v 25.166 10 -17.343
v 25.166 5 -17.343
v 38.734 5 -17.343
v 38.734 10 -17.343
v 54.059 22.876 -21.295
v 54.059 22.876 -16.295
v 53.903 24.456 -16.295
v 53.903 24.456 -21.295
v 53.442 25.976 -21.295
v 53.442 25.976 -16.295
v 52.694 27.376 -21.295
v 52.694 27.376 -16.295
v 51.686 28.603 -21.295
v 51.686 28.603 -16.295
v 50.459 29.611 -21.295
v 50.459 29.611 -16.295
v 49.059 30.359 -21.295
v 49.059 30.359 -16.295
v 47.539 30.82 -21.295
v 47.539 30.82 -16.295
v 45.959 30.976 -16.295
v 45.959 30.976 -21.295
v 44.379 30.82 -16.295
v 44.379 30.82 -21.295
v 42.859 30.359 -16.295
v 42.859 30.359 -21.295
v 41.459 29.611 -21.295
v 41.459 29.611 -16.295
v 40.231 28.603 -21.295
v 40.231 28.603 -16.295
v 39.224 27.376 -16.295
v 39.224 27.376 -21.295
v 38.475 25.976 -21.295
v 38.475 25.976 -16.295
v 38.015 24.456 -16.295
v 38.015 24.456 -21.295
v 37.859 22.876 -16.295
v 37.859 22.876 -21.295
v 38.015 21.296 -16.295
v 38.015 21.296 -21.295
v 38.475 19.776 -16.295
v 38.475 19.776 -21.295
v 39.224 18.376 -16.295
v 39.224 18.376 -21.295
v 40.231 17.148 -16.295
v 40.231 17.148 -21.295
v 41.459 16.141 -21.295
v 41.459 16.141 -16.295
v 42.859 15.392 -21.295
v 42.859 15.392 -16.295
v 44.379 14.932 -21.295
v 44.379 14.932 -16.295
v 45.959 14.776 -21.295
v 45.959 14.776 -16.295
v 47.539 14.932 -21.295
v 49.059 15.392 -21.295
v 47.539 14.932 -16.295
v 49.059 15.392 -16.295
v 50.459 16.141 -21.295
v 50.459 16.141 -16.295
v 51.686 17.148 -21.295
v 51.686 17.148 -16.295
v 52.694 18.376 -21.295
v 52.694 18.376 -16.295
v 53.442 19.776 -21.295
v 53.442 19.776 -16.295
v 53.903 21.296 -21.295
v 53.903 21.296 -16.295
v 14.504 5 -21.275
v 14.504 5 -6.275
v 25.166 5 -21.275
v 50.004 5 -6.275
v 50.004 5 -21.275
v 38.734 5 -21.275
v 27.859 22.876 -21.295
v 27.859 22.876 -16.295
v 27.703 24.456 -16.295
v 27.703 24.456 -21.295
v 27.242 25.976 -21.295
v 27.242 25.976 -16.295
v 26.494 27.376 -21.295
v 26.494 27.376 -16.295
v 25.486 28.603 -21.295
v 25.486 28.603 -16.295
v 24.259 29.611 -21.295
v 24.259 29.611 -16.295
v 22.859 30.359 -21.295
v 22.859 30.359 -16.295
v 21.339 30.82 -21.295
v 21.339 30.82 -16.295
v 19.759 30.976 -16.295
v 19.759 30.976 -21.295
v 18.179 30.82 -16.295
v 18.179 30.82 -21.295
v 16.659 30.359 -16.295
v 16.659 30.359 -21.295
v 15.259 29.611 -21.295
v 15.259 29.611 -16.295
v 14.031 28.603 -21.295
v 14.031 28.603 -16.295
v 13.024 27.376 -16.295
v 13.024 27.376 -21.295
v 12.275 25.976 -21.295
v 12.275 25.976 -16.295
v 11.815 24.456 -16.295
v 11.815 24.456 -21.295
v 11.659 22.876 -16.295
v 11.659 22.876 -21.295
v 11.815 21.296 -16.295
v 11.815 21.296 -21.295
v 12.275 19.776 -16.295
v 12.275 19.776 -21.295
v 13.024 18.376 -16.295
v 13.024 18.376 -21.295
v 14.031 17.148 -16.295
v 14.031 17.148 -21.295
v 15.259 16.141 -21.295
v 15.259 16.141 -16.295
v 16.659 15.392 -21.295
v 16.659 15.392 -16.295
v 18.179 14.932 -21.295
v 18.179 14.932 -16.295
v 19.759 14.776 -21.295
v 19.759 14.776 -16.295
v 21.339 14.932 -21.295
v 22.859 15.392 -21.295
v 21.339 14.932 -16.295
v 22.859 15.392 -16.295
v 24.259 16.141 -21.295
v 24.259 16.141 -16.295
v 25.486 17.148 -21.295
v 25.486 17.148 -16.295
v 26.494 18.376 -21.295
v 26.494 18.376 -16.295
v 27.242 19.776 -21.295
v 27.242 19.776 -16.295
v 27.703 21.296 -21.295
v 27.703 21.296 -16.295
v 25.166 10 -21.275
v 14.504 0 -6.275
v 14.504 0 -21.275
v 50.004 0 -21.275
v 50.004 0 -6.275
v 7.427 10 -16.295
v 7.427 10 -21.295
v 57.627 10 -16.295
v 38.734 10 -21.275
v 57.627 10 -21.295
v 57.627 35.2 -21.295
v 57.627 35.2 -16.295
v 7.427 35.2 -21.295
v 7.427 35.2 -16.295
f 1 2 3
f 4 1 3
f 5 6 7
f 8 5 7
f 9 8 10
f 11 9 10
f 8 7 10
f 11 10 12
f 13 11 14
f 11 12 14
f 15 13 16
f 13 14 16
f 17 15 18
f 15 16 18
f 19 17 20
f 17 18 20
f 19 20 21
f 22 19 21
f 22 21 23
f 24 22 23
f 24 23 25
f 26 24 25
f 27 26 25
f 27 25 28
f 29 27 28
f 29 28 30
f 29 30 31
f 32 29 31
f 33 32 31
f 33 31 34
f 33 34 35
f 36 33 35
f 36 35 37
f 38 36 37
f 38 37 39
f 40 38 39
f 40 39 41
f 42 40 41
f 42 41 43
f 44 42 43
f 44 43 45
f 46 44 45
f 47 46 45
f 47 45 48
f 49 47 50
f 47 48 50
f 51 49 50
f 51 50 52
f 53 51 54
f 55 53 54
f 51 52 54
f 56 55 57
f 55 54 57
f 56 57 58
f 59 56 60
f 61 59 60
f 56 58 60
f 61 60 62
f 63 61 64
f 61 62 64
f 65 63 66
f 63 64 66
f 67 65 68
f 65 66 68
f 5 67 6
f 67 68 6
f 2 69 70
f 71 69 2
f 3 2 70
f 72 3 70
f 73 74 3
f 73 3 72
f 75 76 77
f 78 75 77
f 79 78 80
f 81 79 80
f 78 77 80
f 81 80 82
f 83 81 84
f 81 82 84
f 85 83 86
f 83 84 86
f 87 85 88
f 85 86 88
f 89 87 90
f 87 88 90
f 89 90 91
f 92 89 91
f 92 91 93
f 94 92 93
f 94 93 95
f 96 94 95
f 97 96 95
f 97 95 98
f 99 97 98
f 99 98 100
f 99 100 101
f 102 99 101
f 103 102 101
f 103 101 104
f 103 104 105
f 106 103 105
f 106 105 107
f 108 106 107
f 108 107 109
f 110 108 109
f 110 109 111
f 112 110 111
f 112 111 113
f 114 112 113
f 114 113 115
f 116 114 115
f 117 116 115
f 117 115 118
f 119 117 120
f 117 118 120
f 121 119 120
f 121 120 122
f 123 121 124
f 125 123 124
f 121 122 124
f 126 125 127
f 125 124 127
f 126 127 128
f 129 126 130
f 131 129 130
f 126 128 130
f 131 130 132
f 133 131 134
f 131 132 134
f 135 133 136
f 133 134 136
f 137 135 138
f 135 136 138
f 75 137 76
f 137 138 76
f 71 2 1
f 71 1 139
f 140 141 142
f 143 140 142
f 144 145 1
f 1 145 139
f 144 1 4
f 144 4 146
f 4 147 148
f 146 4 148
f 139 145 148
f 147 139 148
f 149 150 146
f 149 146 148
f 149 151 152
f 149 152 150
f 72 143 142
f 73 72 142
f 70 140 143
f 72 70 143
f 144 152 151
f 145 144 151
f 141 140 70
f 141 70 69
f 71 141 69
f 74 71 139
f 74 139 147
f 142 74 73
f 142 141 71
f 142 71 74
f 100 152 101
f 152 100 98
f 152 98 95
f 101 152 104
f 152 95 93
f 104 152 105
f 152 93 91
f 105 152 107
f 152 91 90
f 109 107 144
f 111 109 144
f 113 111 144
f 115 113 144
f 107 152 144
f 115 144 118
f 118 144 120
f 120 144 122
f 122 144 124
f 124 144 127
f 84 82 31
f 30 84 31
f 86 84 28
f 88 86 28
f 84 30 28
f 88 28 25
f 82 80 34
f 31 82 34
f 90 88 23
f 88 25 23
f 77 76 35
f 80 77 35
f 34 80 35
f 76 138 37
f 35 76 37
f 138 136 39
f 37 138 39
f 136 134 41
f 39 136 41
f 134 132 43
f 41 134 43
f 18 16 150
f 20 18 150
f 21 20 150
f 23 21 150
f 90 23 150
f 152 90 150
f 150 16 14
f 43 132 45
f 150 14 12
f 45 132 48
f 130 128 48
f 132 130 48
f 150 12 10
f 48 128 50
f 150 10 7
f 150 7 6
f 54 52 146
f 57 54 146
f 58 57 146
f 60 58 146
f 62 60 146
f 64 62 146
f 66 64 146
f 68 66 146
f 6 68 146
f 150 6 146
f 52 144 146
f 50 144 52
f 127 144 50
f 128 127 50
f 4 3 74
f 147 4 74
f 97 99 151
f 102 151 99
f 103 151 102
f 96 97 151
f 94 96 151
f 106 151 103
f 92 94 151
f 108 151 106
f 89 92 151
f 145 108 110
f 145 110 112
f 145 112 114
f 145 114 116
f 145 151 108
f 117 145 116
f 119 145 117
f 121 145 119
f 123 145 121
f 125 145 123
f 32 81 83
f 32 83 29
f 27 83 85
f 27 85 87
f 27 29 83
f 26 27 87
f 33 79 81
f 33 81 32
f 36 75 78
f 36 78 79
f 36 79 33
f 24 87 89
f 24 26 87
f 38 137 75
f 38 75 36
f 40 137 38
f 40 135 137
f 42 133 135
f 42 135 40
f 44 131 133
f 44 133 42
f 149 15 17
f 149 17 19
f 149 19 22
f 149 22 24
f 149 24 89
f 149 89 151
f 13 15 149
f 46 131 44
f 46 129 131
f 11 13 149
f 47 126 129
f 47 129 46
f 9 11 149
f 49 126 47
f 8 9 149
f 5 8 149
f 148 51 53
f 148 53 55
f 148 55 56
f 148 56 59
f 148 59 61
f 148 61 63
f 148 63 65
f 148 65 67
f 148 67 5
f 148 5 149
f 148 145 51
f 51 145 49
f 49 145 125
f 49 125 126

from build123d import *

# Parameters (mm, degrees)
SKETCH1_W           = 35.5
SKETCH1_H           = 15
BOSS_EXTRUDE7_DEPTH = 5
SKETCH5_W           = 13.567085075
SKETCH5_H           = 3.932792286
BOSS_EXTRUDE8_DEPTH = 5
SKETCH6_W           = 50.2
SKETCH6_H           = 5
BOSS_EXTRUDE9_DEPTH = 25.2
SKETCH7_R           = 8.1
CUT_EXTRUDE1_DEPTH  = 10


with BuildPart() as part:
    # Sketch1 → Boss-Extrude7 (new body)
    with BuildSketch(Plane(origin=(0, 0, 0), x_dir=(1, 0, 0), z_dir=(0, 1, 0))):
        with Locations((32.254129859, 13.775388257)):
            Rectangle(SKETCH1_W, SKETCH1_H)
    extrude(amount=BOSS_EXTRUDE7_DEPTH)

    # Sketch5 → Boss-Extrude8 (add)
    with BuildSketch(Plane(origin=(0, 5, 0), x_dir=(1, 0, 0), z_dir=(0, 1, 0))):
        with Locations((31.950040022, 19.308992114)):
            Rectangle(SKETCH5_W, SKETCH5_H)
    extrude(amount=BOSS_EXTRUDE8_DEPTH)

    # Sketch6 → Boss-Extrude9 (add)
    with BuildSketch(Plane(origin=(1.124638213, 10, 0), x_dir=(1, 0, 0), z_dir=(0, 1, 0))):
        with Locations((31.402213384, 18.794771585)):
            Rectangle(SKETCH6_W, SKETCH6_H)
    extrude(amount=BOSS_EXTRUDE9_DEPTH)

    # Sketch7 → Cut-Extrude1 (cut)
    with BuildSketch(Plane.XY.offset(-16.294771585)):
        with Locations((19.758900119, 22.875876323)):
            Circle(SKETCH7_R)
        with Locations((45.958900119, 22.875876323)):
            Circle(SKETCH7_R)
    extrude(amount=-CUT_EXTRUDE1_DEPTH, mode=Mode.SUBTRACT)


solid = part.part
